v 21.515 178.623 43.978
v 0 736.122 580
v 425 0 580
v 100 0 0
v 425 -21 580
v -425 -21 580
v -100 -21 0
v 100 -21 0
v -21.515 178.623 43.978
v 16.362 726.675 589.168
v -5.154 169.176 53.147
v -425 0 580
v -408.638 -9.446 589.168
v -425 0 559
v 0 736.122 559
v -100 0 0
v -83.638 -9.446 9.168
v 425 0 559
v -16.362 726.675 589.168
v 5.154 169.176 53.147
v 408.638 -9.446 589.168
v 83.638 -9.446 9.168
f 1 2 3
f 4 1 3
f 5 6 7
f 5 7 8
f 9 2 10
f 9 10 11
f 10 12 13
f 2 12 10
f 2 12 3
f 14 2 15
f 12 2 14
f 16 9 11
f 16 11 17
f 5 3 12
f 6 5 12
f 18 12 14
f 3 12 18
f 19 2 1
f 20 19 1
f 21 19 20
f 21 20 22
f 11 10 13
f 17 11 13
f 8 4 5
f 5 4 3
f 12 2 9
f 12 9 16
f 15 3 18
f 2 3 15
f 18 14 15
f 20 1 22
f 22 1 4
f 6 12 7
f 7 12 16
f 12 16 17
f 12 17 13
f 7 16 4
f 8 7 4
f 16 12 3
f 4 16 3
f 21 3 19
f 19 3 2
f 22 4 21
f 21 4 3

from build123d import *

# Parameters (mm, degrees)
F1_DEPTH = 21
F3_DEPTH = 21
F6_DEPTH = 21


with BuildPart() as f1:
    # F0 (on Front) → F1 (new body)
    with BuildSketch(Plane.XZ):
        Polygon((425, 580), (-425, 580), (-100, 0), (100, 0), align=None)
    extrude(amount=F1_DEPTH)


with BuildPart() as f3:
    # F2 (on face) → F3 (new body)
    with BuildSketch(Plane.XY.offset(580)):
        Polygon((0, 736.1215932168), (-425, 0), (425, 0), align=None)
    extrude(amount=-F3_DEPTH)


with BuildPart() as f6:
    # F5 (on 3pt) → F6 (new body)
    with BuildSketch(Plane(origin=(60.7046722507, 35.047858865, -34.015549106), x_dir=(0.392423502, -0.8931131465, -0.2198924796), z_dir=(-0.7791320315, -0.4498320881, 0.4365826039))):
        Polygon((39.2423502009, 48.8832356298), (39.2423502009, 713.7328426839), (-784.9775104966, 505.9790912573), (-160.7576497991, 48.8832356298), align=None)
    extrude(amount=F6_DEPTH)


with BuildPart() as f7_1:
    # F7: instance of F6
    add(f6.part.mirror(Plane.YZ))


solid = Compound([f1.part, f3.part, f6.part, f7_1.part])
